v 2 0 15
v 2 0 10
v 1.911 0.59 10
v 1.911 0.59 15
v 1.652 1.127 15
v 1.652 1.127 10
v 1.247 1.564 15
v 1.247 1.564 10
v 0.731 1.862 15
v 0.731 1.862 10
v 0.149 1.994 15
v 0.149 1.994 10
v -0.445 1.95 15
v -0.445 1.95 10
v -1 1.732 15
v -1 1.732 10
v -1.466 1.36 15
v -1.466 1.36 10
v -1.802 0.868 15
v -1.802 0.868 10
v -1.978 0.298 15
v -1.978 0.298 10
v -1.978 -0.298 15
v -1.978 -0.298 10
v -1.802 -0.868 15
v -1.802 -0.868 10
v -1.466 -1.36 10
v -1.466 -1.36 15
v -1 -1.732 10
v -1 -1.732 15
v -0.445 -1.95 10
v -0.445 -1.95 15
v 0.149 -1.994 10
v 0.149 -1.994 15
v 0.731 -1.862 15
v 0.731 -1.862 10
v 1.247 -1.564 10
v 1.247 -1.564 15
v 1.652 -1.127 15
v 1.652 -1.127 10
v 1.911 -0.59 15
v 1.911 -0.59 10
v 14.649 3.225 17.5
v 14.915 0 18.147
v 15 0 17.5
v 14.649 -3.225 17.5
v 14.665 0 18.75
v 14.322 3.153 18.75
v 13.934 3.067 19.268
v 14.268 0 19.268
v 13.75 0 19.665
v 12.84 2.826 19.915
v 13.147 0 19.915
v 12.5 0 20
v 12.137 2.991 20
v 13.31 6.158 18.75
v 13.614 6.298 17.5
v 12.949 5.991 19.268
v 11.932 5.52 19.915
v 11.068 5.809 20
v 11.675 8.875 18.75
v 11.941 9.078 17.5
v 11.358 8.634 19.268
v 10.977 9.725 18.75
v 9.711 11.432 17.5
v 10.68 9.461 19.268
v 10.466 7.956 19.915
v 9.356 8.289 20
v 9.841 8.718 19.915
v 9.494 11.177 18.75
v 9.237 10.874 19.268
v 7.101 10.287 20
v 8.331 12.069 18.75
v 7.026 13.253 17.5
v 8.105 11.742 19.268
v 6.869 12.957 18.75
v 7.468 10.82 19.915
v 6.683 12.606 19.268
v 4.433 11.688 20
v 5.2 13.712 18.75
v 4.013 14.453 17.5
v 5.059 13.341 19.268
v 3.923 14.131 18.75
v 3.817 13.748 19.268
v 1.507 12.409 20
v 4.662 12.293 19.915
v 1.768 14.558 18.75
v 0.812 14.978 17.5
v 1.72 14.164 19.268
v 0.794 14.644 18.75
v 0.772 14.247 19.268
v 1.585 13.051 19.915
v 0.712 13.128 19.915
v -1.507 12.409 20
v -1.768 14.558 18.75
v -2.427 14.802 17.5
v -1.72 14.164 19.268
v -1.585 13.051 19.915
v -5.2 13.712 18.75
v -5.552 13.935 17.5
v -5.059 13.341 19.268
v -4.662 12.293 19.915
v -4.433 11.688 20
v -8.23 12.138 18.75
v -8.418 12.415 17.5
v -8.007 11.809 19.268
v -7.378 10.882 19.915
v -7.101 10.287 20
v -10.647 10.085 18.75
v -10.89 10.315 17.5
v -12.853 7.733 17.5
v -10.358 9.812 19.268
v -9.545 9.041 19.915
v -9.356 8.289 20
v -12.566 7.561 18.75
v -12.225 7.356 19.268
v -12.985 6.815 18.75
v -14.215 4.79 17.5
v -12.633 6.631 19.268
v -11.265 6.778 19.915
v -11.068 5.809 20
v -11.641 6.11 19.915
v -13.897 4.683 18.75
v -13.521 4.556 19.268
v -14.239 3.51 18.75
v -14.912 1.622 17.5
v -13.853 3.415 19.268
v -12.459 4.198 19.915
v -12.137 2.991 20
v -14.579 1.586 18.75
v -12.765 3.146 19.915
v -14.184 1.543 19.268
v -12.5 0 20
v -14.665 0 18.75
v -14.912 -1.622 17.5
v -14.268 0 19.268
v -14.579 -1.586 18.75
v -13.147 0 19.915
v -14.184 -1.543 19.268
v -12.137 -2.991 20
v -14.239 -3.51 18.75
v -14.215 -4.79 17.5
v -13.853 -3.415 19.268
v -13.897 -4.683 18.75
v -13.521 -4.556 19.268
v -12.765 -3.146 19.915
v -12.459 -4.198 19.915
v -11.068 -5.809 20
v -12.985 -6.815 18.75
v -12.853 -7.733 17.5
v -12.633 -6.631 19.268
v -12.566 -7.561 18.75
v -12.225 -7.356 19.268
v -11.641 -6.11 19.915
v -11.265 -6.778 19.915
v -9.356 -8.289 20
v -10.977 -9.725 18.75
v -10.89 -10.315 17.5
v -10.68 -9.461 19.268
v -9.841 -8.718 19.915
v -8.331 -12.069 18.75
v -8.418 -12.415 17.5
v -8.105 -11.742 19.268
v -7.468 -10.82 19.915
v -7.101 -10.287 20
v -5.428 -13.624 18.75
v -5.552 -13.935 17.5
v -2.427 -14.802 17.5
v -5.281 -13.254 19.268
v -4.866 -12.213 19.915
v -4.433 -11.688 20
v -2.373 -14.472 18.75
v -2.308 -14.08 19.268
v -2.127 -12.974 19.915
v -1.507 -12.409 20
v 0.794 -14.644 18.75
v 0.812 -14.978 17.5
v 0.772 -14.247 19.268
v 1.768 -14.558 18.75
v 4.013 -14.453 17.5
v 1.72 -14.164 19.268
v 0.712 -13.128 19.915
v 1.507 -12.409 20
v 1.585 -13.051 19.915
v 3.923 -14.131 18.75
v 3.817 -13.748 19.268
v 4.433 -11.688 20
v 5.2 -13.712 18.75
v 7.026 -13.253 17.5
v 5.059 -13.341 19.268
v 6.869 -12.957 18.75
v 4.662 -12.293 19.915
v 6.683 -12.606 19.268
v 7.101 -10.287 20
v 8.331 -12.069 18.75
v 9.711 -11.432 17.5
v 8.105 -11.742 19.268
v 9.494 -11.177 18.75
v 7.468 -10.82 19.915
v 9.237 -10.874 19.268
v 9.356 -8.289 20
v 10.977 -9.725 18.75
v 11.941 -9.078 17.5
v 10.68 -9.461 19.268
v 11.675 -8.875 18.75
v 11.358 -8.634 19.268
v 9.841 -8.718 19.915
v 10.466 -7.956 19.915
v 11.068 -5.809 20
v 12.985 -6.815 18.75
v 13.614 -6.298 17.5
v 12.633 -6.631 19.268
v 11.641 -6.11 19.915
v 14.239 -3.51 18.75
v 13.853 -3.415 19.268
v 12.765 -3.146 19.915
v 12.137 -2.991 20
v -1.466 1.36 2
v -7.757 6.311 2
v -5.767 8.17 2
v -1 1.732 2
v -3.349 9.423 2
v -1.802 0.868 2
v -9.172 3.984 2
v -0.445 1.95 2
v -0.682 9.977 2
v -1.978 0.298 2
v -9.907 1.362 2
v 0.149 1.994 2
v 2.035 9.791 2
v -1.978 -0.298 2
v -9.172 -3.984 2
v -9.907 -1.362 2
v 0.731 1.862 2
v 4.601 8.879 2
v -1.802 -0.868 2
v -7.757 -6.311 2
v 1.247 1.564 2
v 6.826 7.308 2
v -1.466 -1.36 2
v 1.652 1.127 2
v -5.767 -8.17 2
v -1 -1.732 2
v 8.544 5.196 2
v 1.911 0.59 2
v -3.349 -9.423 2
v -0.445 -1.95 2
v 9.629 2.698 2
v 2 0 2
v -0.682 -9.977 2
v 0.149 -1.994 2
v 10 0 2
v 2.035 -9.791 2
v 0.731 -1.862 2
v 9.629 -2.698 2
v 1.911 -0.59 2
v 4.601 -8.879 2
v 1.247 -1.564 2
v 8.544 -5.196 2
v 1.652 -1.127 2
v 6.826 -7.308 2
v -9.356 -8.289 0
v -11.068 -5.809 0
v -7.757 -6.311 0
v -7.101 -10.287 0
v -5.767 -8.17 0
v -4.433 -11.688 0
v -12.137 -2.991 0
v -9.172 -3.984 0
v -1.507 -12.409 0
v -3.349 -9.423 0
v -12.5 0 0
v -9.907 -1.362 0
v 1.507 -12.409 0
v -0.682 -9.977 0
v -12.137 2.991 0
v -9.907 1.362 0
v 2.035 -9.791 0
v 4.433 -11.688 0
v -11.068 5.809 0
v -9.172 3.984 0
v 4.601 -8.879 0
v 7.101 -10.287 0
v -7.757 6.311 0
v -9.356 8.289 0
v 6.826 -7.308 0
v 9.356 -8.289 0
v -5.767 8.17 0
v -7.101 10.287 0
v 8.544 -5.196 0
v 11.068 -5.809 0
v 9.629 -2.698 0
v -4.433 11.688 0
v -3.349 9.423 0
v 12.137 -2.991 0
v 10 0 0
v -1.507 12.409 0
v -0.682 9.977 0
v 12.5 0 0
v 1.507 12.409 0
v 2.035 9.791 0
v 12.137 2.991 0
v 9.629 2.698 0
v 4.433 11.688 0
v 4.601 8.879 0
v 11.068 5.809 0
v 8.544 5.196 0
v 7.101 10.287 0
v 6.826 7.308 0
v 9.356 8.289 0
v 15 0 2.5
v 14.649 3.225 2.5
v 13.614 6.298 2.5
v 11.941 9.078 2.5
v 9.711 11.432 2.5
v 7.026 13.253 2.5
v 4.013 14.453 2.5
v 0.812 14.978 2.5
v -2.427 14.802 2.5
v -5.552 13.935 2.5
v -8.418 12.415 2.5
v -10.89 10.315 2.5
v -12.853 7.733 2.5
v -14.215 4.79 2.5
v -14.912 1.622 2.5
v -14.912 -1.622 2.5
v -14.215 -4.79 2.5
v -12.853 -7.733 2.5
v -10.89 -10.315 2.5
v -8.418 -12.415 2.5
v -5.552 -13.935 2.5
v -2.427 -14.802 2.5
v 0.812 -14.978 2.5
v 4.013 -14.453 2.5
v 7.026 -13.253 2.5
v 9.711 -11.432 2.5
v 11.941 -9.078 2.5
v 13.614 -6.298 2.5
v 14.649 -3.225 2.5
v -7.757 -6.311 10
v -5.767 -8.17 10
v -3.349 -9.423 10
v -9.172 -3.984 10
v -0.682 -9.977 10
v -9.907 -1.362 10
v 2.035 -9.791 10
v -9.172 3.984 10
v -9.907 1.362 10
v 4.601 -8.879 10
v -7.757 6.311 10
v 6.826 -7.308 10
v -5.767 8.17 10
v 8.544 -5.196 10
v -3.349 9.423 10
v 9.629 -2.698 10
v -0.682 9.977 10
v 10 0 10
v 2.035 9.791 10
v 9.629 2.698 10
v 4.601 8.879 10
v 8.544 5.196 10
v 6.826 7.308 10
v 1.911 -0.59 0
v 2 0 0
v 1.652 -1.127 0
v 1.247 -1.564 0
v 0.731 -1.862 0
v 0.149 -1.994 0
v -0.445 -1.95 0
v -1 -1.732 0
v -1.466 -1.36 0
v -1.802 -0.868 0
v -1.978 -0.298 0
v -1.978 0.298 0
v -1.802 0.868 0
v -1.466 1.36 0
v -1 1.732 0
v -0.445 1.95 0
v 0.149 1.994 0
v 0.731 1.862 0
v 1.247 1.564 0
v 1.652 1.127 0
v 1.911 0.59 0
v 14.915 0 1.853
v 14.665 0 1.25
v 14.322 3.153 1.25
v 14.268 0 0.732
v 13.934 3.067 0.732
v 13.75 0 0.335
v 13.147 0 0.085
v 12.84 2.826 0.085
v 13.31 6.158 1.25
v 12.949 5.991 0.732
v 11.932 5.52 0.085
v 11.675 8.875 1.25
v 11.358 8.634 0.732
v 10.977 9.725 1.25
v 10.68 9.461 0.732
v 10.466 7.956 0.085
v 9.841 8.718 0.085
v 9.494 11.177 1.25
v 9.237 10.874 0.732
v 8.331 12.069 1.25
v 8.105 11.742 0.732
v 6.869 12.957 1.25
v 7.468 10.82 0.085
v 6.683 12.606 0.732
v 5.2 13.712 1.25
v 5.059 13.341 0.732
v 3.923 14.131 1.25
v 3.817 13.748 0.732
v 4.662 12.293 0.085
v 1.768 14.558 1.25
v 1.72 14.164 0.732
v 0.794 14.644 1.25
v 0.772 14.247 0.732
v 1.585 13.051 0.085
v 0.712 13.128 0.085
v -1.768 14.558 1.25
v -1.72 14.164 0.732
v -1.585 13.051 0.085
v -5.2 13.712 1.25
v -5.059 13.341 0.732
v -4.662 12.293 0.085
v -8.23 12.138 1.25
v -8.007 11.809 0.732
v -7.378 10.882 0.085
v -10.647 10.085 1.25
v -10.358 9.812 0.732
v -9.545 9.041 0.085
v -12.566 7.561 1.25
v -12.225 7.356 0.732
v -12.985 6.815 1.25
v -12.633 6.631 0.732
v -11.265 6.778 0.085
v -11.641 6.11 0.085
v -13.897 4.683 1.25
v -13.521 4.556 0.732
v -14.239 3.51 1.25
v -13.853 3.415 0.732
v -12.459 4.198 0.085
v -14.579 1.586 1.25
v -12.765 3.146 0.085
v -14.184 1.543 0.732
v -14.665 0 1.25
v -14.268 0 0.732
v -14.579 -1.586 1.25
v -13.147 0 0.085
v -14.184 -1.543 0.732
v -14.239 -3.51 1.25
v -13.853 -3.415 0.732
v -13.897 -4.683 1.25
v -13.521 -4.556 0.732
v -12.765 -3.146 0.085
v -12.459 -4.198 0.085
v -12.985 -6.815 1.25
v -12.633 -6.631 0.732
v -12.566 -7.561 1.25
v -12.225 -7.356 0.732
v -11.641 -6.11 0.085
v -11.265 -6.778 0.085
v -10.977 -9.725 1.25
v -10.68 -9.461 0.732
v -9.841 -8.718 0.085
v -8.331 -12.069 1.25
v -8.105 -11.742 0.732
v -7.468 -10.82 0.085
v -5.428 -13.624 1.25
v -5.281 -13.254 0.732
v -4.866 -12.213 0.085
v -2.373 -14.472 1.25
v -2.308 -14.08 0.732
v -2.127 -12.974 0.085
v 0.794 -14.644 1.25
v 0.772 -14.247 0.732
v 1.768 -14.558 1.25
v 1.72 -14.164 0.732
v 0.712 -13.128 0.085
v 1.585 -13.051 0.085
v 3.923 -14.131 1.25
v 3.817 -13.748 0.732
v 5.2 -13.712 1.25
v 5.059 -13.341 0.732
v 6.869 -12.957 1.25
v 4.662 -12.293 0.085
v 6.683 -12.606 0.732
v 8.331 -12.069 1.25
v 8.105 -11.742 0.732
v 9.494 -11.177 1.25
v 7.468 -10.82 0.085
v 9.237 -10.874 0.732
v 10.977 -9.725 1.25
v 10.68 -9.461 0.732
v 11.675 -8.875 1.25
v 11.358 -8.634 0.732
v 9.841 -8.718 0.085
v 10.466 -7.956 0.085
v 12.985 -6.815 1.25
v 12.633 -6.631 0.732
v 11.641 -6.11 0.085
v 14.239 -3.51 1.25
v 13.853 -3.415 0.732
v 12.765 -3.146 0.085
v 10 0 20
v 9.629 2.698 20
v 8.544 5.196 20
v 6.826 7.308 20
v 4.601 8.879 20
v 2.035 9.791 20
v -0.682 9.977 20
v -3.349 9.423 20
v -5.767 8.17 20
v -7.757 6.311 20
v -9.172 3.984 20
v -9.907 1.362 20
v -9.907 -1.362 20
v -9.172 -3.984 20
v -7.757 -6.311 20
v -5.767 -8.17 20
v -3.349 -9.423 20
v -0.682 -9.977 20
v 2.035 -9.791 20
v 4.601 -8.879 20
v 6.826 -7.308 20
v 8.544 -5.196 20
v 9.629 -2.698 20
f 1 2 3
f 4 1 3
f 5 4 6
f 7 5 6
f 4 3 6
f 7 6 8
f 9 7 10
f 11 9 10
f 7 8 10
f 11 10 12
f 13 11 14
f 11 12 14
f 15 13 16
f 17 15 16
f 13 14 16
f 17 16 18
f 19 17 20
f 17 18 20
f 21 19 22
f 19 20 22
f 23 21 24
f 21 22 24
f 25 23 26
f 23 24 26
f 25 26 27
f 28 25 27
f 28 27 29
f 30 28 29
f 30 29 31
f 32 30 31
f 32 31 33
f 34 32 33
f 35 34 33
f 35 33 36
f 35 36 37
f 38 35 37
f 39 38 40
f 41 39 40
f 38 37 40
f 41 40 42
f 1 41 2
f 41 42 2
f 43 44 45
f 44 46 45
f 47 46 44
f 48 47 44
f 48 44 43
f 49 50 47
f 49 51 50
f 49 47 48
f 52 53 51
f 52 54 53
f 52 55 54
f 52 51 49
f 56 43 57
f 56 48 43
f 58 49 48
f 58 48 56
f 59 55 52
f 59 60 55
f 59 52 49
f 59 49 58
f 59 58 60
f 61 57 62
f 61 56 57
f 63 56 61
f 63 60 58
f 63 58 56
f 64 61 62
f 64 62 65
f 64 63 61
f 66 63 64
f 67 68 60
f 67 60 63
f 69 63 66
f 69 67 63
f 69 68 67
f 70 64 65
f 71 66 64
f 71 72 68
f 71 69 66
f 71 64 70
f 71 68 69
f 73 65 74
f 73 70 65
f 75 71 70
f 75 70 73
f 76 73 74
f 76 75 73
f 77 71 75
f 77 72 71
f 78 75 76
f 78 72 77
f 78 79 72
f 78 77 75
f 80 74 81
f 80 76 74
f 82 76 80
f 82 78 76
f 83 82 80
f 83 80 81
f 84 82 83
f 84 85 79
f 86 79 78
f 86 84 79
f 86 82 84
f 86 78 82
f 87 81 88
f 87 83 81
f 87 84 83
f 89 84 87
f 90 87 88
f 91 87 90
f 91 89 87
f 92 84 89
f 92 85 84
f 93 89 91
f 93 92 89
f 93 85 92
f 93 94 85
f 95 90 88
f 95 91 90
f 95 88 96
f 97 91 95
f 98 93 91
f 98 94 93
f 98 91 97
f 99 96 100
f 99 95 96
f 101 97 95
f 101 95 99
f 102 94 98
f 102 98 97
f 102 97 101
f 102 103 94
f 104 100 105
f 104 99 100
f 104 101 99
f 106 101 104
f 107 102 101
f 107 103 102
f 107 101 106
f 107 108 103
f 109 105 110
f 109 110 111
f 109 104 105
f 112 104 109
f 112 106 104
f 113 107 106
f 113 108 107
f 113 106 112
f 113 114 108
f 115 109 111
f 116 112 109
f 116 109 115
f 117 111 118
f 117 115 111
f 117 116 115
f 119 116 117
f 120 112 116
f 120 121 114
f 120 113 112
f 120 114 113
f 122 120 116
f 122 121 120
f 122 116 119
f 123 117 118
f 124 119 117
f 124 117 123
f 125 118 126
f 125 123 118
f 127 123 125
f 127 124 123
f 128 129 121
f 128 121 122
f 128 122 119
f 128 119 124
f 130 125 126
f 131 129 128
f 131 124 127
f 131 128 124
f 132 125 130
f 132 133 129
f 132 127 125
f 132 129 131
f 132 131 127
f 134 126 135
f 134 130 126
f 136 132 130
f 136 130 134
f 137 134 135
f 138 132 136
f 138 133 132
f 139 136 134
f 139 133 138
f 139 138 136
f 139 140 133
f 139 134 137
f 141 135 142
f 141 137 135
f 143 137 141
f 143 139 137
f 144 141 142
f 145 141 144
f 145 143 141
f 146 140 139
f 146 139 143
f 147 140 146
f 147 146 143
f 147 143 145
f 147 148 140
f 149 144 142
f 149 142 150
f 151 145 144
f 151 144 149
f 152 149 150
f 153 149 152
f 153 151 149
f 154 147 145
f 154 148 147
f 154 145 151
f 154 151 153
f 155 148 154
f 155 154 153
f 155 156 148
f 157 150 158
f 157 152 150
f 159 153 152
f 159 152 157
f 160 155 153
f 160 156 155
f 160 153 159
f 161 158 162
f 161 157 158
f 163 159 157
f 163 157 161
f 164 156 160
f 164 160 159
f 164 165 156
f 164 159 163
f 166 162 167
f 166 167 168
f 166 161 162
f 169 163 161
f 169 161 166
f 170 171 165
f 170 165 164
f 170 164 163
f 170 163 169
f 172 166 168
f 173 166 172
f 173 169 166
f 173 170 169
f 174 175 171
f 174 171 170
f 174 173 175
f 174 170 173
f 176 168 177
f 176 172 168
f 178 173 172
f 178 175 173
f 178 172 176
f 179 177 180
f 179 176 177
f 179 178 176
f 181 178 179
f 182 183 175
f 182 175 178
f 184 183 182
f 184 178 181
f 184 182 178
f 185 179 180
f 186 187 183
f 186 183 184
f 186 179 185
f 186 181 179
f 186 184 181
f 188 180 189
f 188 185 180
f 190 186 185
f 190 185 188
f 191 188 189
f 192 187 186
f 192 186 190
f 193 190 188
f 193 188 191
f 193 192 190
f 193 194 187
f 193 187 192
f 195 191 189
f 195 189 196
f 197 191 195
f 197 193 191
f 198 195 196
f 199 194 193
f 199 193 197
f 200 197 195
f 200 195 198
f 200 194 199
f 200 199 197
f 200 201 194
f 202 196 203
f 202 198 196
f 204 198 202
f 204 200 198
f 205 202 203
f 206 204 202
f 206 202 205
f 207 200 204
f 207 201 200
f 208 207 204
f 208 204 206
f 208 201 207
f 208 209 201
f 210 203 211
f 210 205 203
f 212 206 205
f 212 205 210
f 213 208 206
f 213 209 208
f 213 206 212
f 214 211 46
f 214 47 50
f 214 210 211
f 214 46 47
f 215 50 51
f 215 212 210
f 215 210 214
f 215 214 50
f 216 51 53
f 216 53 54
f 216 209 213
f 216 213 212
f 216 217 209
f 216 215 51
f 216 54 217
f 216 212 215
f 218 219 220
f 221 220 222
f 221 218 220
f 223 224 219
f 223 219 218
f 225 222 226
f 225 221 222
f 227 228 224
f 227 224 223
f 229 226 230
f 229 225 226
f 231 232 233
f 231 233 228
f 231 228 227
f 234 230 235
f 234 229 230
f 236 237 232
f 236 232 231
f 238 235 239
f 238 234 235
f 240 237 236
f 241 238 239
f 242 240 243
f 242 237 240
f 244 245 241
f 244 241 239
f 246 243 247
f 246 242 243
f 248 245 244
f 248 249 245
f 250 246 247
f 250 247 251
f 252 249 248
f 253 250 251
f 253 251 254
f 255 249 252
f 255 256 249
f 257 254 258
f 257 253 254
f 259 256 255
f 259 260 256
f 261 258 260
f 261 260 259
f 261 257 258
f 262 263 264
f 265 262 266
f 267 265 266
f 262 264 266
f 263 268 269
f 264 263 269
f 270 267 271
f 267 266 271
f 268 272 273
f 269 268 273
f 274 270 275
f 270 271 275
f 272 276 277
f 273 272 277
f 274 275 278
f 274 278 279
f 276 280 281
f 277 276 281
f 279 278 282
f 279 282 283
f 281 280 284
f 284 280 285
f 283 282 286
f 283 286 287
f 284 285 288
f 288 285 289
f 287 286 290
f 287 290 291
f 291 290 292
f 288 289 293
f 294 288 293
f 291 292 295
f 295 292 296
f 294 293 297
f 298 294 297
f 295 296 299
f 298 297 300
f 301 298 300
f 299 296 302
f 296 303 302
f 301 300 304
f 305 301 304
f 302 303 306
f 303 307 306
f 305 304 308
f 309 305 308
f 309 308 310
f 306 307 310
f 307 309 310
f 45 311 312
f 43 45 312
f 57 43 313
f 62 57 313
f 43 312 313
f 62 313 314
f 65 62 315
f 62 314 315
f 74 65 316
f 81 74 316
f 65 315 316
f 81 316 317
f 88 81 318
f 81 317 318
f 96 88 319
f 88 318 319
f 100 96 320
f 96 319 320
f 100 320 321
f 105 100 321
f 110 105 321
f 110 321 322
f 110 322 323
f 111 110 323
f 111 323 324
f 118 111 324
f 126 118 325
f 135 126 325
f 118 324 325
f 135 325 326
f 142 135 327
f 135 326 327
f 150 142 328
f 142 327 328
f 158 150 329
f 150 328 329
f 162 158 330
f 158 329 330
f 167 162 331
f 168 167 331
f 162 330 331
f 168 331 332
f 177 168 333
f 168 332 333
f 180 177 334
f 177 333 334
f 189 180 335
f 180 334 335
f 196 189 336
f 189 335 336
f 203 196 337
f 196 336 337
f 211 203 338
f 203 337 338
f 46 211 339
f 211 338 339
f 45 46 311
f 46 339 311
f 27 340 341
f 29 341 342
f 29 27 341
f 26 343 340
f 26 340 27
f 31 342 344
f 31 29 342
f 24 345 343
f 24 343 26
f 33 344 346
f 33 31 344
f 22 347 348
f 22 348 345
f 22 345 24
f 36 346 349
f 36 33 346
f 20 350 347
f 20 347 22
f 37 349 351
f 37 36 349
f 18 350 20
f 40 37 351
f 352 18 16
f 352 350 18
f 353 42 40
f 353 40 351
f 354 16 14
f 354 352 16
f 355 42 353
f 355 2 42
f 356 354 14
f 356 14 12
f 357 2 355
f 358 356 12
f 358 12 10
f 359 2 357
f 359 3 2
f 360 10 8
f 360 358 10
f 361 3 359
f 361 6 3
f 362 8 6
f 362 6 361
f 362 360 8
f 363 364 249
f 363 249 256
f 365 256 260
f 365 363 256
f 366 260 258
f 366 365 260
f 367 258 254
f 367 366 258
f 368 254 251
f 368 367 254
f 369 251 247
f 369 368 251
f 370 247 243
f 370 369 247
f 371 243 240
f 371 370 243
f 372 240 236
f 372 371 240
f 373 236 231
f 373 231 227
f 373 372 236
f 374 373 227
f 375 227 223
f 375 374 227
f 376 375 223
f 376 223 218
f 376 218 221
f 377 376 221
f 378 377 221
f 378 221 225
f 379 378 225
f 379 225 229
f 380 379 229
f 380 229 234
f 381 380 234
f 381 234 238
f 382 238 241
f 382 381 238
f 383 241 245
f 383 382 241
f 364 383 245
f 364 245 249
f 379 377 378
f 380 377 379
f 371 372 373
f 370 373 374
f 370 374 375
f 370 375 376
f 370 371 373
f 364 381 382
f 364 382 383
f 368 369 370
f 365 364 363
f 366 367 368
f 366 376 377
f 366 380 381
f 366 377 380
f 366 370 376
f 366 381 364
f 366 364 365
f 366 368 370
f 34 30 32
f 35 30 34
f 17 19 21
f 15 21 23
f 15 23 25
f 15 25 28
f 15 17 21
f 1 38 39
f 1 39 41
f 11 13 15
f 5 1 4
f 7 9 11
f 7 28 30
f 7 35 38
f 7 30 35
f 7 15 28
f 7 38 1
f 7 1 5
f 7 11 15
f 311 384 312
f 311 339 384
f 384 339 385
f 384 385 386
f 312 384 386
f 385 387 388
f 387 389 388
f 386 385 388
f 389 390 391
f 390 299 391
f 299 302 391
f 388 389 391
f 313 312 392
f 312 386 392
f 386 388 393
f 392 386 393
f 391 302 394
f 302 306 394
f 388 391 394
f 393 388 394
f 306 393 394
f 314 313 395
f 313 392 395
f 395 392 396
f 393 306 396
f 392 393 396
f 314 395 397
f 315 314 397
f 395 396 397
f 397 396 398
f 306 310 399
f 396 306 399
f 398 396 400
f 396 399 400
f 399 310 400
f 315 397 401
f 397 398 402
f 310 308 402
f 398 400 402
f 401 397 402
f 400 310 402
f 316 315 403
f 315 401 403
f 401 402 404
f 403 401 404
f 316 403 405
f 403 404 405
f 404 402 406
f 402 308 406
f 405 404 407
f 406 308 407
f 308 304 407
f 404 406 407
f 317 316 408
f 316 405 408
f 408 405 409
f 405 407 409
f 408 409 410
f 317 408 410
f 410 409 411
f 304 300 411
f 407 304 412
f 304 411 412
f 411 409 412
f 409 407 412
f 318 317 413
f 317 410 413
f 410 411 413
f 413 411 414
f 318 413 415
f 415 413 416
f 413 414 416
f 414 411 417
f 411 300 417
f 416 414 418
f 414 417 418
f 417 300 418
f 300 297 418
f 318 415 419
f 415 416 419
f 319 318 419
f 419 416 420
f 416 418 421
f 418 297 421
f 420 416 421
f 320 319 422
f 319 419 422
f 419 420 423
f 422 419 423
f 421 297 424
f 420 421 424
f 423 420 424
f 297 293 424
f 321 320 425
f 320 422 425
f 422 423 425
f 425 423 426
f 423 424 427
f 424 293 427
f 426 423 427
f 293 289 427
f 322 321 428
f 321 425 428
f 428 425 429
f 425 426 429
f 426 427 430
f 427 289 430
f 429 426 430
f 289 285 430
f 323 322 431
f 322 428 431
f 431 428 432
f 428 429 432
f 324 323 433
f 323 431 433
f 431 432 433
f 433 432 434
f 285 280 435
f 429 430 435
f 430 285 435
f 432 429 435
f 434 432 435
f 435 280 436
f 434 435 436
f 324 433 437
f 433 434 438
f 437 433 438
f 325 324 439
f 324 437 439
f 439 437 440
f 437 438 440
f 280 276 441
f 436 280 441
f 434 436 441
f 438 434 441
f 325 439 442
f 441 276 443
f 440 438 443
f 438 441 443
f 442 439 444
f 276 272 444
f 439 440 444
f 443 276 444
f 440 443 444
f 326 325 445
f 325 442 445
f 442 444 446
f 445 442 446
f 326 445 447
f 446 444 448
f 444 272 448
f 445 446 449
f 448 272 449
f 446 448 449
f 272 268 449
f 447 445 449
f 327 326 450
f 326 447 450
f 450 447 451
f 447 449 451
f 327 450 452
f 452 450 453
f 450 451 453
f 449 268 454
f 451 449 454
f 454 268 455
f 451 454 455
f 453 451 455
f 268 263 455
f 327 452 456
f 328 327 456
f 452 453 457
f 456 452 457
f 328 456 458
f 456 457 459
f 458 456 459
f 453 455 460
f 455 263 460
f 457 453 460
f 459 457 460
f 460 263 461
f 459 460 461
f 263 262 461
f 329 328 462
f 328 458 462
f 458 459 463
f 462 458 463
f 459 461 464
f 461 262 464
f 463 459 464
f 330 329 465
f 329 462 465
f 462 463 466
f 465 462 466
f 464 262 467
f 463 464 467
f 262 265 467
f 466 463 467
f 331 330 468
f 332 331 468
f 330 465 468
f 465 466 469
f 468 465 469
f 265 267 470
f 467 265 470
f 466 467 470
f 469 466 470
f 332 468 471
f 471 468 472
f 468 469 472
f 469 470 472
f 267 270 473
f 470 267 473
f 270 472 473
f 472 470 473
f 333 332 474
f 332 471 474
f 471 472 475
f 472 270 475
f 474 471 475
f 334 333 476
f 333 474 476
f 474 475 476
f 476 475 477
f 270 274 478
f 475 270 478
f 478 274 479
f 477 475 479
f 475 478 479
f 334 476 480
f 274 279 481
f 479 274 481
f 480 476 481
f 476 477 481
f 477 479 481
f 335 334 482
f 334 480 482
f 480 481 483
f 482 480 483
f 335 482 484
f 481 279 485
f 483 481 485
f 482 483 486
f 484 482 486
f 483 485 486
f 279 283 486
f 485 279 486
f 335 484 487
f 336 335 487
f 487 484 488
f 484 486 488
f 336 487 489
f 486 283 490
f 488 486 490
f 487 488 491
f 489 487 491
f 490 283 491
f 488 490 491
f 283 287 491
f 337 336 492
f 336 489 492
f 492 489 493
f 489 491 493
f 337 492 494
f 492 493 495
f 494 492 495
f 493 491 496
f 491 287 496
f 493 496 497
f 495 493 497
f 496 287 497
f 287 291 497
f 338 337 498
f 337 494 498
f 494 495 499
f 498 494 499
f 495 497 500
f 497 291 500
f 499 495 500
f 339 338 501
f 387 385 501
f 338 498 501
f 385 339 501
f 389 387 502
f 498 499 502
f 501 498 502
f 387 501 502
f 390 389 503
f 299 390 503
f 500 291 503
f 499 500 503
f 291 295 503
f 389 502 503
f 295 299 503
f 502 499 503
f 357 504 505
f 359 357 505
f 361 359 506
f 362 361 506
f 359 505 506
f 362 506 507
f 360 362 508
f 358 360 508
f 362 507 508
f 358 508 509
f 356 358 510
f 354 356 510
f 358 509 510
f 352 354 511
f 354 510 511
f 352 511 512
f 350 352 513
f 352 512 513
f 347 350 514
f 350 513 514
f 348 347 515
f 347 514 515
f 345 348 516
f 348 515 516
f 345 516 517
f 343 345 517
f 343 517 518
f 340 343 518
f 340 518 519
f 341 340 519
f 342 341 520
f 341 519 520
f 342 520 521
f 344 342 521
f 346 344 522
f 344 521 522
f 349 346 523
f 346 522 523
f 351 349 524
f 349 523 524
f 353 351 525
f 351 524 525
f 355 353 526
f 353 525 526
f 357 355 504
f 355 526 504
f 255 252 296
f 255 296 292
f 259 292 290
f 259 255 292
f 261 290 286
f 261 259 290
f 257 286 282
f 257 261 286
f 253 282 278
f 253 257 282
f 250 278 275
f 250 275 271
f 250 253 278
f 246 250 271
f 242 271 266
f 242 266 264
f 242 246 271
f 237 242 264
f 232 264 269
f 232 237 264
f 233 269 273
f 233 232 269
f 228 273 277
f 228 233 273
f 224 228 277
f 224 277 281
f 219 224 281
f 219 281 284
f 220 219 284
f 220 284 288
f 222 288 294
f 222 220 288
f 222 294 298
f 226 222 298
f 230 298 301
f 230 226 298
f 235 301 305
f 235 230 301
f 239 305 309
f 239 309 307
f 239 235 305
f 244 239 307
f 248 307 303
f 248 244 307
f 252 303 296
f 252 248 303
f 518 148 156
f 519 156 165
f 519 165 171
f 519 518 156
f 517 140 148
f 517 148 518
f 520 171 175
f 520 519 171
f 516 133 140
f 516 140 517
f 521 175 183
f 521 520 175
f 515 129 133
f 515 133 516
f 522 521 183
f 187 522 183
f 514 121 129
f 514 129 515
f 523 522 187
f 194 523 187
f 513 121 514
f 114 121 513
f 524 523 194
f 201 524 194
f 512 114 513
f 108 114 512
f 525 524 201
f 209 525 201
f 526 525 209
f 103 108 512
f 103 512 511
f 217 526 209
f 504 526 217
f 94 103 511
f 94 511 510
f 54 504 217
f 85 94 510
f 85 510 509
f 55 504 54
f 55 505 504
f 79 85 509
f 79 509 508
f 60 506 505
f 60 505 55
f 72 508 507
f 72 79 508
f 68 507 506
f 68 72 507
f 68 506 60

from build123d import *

# Parameters (mm, degrees)
SKETCH1_R           = 15
BOSS_EXTRUDE1_DEPTH = 20
SKETCH2_R           = 10
CUT_EXTRUDE1_DEPTH  = 10
CUT_EXTRUDE3_START  = -2
SKETCH3_R           = 10
CUT_EXTRUDE3_DEPTH  = 2
SKETCH4_R           = 2
BOSS_EXTRUDE2_DEPTH = 5
BOSS_EXTRUDE3_START = 2
SKETCH5_R           = 2
BOSS_EXTRUDE3_DEPTH = 2
FILLET2_R           = 2.5
FILLET3_R           = 2.5


with BuildPart() as part:
    # Sketch1 → Boss-Extrude1 (new body)
    with BuildSketch(Plane.XY):
        Circle(SKETCH1_R)
    extrude(amount=BOSS_EXTRUDE1_DEPTH)

    # Sketch2 → Cut-Extrude1 (cut)
    with BuildSketch(Plane.XY.offset(20)):
        Circle(SKETCH2_R)
    extrude(amount=-CUT_EXTRUDE1_DEPTH, mode=Mode.SUBTRACT)

    # Sketch3 → Cut-Extrude3 (cut)
    with BuildSketch(Plane(origin=(0, 0, 0), x_dir=(-1, 0, 0), z_dir=(0, 0, -1)).offset(CUT_EXTRUDE3_START)):
        Circle(SKETCH3_R)
    extrude(amount=CUT_EXTRUDE3_DEPTH, mode=Mode.SUBTRACT)

    # Sketch4 → Boss-Extrude2 (add)
    with BuildSketch(Plane.XY.offset(10)):
        Circle(SKETCH4_R)
    extrude(amount=BOSS_EXTRUDE2_DEPTH)

    # Sketch5 → Boss-Extrude3 (add)
    with BuildSketch(Plane(origin=(0, 0, 2), x_dir=(-1, 0, 0), z_dir=(0, 0, -1)).offset(BOSS_EXTRUDE3_START)):
        Circle(SKETCH5_R)
    extrude(amount=-BOSS_EXTRUDE3_DEPTH)

    # Fillet2
    fillet2_edges = [part.edges().sort_by_distance(p)[0] for p in [
        (-15, 0, 20),
    ]]
    fillet(fillet2_edges, radius=FILLET2_R)

    # Fillet3
    fillet3_edges = [part.edges().sort_by_distance(p)[0] for p in [
        (-15, 0, 0),
    ]]
    fillet(fillet3_edges, radius=FILLET3_R)


solid = part.part
